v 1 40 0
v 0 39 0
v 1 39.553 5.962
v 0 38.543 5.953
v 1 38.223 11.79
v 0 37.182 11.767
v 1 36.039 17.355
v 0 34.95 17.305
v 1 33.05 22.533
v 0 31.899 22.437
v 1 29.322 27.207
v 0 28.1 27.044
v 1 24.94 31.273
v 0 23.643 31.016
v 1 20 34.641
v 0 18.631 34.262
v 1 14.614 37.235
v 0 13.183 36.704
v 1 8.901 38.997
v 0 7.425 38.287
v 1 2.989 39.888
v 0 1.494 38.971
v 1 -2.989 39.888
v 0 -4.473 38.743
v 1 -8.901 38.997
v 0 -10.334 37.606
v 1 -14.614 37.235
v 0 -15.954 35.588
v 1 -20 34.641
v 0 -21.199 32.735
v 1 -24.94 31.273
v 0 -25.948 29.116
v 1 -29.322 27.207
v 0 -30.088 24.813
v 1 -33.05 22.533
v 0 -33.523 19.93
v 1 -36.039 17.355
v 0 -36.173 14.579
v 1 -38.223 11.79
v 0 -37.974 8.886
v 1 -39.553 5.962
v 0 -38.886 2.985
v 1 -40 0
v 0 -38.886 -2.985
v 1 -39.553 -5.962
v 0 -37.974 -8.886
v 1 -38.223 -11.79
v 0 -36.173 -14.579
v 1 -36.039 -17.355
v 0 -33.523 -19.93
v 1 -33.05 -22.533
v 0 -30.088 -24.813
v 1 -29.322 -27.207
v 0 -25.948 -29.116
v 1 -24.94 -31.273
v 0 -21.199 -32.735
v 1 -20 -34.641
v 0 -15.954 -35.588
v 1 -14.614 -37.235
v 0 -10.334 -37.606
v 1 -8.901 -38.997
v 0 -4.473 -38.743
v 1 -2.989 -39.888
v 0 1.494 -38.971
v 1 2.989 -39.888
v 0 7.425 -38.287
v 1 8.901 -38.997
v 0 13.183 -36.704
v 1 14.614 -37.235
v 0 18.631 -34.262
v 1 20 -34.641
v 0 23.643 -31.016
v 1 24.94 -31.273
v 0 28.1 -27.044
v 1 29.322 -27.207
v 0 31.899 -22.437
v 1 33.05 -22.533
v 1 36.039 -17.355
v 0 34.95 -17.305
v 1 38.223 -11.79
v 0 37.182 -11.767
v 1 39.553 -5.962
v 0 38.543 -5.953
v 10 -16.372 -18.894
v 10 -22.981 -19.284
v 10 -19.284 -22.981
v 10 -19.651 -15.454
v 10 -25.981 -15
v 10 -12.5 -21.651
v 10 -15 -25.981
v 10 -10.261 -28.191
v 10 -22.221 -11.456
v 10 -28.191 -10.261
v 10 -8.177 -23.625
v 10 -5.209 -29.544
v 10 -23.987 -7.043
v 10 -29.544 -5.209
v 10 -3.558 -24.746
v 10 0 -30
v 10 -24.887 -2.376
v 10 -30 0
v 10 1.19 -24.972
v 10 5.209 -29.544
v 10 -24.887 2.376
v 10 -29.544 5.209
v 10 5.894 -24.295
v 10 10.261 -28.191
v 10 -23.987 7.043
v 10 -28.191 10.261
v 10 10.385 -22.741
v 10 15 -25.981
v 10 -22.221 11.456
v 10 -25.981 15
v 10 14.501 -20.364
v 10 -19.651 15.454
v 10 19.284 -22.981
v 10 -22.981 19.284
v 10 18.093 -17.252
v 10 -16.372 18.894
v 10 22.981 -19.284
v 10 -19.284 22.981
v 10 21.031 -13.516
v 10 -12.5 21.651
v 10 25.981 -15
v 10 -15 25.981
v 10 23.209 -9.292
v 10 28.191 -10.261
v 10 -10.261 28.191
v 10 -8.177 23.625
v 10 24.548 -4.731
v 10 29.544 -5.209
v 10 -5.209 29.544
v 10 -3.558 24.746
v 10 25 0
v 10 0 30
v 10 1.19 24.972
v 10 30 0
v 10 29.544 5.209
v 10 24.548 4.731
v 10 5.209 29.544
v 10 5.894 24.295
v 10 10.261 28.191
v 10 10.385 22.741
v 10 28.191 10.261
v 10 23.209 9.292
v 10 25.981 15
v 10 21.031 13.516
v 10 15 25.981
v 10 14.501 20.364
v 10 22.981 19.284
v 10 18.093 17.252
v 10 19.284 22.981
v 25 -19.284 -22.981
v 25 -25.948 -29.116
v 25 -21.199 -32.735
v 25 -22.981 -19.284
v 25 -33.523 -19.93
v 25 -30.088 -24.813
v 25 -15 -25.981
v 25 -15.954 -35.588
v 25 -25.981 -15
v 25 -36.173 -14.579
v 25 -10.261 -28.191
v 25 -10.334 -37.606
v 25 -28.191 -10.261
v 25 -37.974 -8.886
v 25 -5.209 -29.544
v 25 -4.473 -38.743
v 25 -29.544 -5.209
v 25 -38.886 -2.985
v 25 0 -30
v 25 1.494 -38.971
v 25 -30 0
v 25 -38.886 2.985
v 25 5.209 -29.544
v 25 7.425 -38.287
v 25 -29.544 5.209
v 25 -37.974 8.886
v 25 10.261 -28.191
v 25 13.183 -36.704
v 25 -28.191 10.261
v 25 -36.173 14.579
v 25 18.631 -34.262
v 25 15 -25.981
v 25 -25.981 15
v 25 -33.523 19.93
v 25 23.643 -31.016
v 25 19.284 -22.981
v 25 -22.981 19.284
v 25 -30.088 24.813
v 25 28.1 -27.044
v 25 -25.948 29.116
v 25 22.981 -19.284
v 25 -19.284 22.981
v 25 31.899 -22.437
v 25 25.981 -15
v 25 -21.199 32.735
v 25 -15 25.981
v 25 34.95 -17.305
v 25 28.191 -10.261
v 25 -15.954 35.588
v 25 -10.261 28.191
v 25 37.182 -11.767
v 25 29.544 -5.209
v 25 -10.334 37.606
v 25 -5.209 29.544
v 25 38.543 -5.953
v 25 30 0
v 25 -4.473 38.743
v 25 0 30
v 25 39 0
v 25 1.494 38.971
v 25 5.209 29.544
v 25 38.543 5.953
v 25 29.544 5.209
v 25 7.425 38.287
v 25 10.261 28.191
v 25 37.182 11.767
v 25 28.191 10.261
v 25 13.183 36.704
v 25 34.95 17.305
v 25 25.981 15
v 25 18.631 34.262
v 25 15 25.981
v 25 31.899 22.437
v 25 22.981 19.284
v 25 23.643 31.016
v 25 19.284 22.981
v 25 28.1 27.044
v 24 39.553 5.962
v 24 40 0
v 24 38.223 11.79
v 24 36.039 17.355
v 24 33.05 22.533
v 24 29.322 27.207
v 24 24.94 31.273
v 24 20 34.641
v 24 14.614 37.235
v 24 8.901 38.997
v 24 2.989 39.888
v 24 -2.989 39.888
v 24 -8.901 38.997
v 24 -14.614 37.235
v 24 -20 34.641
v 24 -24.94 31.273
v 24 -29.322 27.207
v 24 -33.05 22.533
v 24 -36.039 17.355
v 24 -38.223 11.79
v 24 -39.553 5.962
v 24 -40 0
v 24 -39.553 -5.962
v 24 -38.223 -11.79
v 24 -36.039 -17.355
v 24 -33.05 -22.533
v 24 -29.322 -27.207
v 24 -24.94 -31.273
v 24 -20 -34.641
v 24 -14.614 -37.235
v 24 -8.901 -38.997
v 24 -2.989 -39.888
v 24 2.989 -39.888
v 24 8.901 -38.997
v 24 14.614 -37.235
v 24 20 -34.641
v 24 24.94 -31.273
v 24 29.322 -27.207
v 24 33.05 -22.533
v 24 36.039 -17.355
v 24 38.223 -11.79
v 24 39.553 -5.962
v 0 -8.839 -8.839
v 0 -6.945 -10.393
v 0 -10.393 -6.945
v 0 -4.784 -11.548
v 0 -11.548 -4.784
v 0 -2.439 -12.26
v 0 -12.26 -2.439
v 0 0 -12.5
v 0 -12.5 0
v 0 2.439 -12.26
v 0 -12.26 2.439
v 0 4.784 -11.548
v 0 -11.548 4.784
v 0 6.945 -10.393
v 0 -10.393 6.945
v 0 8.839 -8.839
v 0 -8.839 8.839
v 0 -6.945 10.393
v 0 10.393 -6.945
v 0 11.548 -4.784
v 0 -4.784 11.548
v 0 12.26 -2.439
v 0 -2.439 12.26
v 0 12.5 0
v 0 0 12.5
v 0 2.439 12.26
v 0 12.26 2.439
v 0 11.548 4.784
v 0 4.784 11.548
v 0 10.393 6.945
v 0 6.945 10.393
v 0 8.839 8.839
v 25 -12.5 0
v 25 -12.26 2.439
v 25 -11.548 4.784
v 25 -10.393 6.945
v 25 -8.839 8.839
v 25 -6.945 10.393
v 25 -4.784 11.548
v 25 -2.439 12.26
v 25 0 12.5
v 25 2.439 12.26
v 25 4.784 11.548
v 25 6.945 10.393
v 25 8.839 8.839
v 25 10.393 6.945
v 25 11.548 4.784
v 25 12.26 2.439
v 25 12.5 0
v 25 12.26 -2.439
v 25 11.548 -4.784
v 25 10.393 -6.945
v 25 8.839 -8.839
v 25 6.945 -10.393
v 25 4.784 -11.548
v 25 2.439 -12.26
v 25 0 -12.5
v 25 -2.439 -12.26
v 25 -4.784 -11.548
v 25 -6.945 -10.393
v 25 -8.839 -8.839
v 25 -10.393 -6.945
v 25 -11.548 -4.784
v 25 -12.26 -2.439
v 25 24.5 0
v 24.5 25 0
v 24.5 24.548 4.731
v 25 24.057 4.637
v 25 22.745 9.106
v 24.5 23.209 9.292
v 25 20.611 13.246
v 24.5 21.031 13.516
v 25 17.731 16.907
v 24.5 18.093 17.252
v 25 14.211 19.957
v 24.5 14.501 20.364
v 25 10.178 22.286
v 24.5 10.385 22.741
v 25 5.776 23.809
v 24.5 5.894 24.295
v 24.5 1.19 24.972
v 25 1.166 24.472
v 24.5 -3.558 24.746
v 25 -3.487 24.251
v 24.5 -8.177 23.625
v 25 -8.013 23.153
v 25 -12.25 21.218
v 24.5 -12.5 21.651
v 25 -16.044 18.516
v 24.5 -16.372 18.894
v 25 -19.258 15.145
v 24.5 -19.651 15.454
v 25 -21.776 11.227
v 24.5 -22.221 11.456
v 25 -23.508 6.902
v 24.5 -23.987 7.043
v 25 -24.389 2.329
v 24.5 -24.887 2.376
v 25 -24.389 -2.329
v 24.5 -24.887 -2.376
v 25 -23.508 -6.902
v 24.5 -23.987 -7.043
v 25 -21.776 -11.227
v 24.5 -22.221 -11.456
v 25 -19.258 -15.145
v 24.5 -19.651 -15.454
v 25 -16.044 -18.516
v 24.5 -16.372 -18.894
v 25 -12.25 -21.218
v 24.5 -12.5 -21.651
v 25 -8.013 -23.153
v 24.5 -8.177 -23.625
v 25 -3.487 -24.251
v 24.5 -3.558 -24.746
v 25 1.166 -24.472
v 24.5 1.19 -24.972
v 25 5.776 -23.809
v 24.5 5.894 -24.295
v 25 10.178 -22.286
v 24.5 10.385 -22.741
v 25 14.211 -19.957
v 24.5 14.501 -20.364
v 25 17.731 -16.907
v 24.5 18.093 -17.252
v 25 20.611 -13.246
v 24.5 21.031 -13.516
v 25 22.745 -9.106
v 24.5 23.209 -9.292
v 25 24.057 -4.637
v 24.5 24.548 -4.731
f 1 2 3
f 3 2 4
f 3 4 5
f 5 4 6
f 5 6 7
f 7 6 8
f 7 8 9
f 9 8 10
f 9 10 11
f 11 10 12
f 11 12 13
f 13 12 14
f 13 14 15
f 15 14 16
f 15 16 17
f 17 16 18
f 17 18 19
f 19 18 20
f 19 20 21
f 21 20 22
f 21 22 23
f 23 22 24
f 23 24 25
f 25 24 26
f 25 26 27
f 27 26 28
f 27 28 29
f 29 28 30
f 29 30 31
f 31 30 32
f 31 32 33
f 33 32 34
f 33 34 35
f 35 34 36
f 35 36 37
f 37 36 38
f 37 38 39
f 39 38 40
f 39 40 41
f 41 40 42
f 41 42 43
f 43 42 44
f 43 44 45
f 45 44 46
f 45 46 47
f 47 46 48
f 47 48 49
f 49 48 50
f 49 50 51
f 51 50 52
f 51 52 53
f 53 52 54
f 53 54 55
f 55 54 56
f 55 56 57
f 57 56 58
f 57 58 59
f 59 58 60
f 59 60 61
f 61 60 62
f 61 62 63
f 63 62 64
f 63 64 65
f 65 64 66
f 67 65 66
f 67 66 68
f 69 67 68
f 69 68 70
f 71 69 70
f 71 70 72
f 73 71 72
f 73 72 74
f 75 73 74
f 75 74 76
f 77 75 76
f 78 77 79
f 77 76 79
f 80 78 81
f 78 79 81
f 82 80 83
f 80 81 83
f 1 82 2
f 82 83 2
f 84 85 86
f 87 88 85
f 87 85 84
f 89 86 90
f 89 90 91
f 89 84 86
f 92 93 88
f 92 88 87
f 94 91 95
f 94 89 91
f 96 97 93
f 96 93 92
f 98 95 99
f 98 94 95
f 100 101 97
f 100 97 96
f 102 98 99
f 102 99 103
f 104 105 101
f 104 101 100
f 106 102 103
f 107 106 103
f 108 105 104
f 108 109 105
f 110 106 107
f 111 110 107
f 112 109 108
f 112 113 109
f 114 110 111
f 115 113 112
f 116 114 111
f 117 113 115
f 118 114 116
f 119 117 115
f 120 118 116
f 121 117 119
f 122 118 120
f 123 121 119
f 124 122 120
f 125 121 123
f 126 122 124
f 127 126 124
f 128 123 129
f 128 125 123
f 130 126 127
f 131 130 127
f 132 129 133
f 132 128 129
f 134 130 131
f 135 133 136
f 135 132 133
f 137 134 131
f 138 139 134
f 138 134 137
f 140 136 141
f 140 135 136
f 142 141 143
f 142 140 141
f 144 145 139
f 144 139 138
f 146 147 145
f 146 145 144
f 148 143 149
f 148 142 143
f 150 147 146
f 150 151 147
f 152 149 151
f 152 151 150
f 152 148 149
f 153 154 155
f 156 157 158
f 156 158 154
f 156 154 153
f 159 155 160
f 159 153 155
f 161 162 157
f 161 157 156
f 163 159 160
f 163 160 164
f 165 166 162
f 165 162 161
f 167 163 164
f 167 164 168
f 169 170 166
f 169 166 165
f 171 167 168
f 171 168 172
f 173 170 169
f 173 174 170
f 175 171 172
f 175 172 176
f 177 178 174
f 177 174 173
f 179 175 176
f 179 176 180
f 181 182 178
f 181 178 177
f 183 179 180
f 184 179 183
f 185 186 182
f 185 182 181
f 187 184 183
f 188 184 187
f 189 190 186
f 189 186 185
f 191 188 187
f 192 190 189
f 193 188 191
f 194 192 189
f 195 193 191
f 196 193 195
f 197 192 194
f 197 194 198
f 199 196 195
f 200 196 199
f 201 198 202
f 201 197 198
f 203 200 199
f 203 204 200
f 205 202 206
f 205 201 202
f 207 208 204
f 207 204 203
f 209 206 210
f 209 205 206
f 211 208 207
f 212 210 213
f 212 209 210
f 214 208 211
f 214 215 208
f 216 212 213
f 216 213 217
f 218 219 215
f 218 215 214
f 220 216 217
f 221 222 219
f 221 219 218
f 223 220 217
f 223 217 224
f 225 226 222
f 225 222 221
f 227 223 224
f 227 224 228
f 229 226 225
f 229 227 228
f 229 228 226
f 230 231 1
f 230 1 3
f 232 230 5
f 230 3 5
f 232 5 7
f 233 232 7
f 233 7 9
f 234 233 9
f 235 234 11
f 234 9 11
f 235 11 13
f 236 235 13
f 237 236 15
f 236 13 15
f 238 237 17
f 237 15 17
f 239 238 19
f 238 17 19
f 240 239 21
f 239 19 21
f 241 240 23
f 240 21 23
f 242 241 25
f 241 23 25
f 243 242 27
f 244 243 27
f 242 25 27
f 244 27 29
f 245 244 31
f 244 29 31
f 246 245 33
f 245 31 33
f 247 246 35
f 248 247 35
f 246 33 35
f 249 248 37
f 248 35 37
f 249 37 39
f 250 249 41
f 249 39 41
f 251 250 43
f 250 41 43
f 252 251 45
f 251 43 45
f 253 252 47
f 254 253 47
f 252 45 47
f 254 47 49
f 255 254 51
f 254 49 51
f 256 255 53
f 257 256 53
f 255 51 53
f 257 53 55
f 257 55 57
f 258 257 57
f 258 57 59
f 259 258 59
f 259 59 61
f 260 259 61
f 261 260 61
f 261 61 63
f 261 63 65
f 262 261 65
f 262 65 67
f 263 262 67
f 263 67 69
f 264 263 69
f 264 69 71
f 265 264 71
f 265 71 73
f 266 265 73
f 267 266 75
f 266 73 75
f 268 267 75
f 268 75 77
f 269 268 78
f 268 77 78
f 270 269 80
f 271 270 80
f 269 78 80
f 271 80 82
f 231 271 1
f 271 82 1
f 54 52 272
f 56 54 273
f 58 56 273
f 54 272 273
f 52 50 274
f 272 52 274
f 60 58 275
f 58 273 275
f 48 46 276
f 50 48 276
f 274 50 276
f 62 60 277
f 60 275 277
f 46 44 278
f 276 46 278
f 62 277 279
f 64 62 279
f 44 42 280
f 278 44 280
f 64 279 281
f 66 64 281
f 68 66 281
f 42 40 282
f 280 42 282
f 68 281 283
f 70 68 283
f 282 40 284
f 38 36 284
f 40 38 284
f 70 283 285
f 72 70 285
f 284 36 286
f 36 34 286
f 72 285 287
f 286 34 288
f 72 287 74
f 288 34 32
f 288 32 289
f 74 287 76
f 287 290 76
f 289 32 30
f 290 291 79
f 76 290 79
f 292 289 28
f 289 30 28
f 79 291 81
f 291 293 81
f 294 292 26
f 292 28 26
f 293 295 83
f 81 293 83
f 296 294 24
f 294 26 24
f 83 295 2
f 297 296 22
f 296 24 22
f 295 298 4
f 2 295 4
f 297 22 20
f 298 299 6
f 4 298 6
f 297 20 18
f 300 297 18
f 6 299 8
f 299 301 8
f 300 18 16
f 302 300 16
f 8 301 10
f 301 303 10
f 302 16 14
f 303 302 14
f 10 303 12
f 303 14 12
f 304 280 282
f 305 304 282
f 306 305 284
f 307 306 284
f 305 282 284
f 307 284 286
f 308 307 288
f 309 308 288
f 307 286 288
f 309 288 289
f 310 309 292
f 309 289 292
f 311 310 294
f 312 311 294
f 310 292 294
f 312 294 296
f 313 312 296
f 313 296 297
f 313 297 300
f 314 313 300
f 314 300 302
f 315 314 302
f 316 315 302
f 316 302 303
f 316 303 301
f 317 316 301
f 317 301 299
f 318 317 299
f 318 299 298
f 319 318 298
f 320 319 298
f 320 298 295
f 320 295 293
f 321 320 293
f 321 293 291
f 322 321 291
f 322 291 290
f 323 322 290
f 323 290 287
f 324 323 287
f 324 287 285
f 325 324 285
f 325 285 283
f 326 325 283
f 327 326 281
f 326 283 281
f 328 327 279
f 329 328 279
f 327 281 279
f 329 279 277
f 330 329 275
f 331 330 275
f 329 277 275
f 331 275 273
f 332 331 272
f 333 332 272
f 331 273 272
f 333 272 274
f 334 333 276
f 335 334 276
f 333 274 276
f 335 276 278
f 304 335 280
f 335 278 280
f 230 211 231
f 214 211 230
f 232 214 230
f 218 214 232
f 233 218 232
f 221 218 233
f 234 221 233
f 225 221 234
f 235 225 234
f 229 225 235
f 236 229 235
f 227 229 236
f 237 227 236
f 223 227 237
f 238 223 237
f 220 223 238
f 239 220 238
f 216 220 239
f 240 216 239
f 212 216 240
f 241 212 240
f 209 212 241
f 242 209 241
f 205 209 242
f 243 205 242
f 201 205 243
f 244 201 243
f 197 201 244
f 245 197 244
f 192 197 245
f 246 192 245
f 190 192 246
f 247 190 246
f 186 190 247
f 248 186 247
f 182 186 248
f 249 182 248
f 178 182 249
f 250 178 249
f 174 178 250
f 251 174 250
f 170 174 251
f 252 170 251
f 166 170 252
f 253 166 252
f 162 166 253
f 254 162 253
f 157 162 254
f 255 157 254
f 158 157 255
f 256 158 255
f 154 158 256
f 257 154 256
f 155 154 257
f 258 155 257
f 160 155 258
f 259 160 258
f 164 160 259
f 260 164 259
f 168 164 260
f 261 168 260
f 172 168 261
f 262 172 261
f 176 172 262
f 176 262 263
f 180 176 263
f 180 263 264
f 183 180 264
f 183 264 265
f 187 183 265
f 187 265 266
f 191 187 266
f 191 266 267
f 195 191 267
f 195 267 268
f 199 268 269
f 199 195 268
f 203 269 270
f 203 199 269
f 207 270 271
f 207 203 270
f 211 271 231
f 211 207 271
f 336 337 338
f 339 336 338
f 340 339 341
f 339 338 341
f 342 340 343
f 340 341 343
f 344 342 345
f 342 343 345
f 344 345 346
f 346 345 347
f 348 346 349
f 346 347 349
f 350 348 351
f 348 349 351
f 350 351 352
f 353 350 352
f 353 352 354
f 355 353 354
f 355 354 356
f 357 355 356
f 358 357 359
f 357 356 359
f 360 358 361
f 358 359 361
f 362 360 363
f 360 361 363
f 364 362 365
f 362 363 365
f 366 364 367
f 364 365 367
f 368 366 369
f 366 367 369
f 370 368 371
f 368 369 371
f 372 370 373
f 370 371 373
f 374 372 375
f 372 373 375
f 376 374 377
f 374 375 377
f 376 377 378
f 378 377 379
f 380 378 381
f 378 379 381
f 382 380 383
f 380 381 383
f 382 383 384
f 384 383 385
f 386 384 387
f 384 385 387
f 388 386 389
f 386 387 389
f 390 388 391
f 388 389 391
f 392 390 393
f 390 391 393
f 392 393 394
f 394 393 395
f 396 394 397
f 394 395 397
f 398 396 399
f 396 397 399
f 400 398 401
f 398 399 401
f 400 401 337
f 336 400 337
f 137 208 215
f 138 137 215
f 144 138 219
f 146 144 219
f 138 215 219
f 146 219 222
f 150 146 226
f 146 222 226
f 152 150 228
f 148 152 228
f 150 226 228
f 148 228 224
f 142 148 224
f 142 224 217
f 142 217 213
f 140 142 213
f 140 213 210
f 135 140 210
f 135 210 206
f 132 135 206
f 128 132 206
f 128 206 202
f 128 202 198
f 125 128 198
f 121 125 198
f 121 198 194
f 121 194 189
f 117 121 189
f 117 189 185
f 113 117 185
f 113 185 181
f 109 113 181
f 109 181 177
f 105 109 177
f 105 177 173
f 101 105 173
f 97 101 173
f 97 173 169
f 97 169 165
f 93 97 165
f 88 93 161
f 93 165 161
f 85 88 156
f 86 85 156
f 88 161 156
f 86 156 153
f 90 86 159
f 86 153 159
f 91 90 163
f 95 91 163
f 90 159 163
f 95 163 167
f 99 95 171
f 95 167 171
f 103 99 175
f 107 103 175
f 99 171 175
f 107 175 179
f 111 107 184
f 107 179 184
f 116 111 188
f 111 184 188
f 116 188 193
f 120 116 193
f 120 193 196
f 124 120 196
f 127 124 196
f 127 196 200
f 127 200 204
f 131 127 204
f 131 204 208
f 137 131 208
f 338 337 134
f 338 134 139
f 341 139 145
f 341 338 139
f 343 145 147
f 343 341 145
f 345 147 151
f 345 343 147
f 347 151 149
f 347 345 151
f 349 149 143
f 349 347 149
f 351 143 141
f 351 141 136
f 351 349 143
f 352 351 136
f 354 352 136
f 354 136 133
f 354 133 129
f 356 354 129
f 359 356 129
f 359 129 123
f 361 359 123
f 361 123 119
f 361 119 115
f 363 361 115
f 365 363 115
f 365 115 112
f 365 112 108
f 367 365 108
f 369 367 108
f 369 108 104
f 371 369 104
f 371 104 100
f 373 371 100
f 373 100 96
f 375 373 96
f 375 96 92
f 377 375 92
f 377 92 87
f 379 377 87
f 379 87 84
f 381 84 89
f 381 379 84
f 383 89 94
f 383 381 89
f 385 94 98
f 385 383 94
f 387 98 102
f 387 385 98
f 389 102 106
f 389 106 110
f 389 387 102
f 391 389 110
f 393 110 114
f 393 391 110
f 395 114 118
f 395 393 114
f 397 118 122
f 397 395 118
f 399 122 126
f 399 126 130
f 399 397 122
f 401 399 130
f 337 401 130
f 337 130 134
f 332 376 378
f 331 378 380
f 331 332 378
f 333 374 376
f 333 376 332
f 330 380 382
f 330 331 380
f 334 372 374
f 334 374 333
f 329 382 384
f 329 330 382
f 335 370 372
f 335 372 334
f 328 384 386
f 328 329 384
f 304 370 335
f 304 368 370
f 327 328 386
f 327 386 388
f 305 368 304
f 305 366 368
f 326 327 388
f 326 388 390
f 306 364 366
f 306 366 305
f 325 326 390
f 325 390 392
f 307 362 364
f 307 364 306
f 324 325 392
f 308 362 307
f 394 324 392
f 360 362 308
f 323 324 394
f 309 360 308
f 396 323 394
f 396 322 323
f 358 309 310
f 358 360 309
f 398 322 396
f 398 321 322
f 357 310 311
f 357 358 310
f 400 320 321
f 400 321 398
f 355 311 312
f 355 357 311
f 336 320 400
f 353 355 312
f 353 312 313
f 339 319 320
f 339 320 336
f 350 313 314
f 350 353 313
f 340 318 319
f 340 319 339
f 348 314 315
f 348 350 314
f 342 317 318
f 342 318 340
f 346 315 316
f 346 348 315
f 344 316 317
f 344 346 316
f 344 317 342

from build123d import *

# Parameters (mm, degrees)
F0_R     = 40
F1_DEPTH = 25
F2_R     = 12.5
F3_DEPTH = 25.001
F4_SIZE  = 1
F5_R     = 30
F5_R_2   = 25
F6_DEPTH = 15
F8_SIZE  = 0.5
F9_DEPTH = 10


# Not quite as in the source:
# - two fillets or chamfers of one size are made in one step


with BuildPart() as f1:
    # F0 (on Right) → F1 (new body)
    with BuildSketch(Plane.YZ):
        Circle(F0_R)
    extrude(amount=F1_DEPTH)

    # F2 (on face) → F3 (cut, through all)
    with BuildSketch(Plane(origin=(0, 0, 0), x_dir=(0, -1, 0), z_dir=(-1, 0, 0))):
        Circle(F2_R)
    extrude(amount=-F3_DEPTH, mode=Mode.SUBTRACT)

    # F4
    f4_edges = [f1.edges().sort_by_distance(p)[0] for p in [
        (0, -40, 0),
        (25, -40, 0),
    ]]
    chamfer(f4_edges, length=F4_SIZE)

    # F5 (on face) → F6 (cut)
    with BuildSketch(Plane.YZ.offset(25)):
        Circle(F5_R)
        Circle(F5_R_2, mode=Mode.SUBTRACT)
    extrude(amount=-F6_DEPTH, mode=Mode.SUBTRACT)

    # F8
    f8_edges = [f1.edges().sort_by_distance(p)[0] for p in [
        (25, -25, 0),
    ]]
    chamfer(f8_edges, length=F8_SIZE)

    # F5 (on face) → F9 (cut)
    with BuildSketch(Plane.YZ.offset(25)):
        Circle(F5_R)
        Circle(F5_R_2, mode=Mode.SUBTRACT)
    extrude(amount=-F9_DEPTH, mode=Mode.SUBTRACT)


solid = f1.part
